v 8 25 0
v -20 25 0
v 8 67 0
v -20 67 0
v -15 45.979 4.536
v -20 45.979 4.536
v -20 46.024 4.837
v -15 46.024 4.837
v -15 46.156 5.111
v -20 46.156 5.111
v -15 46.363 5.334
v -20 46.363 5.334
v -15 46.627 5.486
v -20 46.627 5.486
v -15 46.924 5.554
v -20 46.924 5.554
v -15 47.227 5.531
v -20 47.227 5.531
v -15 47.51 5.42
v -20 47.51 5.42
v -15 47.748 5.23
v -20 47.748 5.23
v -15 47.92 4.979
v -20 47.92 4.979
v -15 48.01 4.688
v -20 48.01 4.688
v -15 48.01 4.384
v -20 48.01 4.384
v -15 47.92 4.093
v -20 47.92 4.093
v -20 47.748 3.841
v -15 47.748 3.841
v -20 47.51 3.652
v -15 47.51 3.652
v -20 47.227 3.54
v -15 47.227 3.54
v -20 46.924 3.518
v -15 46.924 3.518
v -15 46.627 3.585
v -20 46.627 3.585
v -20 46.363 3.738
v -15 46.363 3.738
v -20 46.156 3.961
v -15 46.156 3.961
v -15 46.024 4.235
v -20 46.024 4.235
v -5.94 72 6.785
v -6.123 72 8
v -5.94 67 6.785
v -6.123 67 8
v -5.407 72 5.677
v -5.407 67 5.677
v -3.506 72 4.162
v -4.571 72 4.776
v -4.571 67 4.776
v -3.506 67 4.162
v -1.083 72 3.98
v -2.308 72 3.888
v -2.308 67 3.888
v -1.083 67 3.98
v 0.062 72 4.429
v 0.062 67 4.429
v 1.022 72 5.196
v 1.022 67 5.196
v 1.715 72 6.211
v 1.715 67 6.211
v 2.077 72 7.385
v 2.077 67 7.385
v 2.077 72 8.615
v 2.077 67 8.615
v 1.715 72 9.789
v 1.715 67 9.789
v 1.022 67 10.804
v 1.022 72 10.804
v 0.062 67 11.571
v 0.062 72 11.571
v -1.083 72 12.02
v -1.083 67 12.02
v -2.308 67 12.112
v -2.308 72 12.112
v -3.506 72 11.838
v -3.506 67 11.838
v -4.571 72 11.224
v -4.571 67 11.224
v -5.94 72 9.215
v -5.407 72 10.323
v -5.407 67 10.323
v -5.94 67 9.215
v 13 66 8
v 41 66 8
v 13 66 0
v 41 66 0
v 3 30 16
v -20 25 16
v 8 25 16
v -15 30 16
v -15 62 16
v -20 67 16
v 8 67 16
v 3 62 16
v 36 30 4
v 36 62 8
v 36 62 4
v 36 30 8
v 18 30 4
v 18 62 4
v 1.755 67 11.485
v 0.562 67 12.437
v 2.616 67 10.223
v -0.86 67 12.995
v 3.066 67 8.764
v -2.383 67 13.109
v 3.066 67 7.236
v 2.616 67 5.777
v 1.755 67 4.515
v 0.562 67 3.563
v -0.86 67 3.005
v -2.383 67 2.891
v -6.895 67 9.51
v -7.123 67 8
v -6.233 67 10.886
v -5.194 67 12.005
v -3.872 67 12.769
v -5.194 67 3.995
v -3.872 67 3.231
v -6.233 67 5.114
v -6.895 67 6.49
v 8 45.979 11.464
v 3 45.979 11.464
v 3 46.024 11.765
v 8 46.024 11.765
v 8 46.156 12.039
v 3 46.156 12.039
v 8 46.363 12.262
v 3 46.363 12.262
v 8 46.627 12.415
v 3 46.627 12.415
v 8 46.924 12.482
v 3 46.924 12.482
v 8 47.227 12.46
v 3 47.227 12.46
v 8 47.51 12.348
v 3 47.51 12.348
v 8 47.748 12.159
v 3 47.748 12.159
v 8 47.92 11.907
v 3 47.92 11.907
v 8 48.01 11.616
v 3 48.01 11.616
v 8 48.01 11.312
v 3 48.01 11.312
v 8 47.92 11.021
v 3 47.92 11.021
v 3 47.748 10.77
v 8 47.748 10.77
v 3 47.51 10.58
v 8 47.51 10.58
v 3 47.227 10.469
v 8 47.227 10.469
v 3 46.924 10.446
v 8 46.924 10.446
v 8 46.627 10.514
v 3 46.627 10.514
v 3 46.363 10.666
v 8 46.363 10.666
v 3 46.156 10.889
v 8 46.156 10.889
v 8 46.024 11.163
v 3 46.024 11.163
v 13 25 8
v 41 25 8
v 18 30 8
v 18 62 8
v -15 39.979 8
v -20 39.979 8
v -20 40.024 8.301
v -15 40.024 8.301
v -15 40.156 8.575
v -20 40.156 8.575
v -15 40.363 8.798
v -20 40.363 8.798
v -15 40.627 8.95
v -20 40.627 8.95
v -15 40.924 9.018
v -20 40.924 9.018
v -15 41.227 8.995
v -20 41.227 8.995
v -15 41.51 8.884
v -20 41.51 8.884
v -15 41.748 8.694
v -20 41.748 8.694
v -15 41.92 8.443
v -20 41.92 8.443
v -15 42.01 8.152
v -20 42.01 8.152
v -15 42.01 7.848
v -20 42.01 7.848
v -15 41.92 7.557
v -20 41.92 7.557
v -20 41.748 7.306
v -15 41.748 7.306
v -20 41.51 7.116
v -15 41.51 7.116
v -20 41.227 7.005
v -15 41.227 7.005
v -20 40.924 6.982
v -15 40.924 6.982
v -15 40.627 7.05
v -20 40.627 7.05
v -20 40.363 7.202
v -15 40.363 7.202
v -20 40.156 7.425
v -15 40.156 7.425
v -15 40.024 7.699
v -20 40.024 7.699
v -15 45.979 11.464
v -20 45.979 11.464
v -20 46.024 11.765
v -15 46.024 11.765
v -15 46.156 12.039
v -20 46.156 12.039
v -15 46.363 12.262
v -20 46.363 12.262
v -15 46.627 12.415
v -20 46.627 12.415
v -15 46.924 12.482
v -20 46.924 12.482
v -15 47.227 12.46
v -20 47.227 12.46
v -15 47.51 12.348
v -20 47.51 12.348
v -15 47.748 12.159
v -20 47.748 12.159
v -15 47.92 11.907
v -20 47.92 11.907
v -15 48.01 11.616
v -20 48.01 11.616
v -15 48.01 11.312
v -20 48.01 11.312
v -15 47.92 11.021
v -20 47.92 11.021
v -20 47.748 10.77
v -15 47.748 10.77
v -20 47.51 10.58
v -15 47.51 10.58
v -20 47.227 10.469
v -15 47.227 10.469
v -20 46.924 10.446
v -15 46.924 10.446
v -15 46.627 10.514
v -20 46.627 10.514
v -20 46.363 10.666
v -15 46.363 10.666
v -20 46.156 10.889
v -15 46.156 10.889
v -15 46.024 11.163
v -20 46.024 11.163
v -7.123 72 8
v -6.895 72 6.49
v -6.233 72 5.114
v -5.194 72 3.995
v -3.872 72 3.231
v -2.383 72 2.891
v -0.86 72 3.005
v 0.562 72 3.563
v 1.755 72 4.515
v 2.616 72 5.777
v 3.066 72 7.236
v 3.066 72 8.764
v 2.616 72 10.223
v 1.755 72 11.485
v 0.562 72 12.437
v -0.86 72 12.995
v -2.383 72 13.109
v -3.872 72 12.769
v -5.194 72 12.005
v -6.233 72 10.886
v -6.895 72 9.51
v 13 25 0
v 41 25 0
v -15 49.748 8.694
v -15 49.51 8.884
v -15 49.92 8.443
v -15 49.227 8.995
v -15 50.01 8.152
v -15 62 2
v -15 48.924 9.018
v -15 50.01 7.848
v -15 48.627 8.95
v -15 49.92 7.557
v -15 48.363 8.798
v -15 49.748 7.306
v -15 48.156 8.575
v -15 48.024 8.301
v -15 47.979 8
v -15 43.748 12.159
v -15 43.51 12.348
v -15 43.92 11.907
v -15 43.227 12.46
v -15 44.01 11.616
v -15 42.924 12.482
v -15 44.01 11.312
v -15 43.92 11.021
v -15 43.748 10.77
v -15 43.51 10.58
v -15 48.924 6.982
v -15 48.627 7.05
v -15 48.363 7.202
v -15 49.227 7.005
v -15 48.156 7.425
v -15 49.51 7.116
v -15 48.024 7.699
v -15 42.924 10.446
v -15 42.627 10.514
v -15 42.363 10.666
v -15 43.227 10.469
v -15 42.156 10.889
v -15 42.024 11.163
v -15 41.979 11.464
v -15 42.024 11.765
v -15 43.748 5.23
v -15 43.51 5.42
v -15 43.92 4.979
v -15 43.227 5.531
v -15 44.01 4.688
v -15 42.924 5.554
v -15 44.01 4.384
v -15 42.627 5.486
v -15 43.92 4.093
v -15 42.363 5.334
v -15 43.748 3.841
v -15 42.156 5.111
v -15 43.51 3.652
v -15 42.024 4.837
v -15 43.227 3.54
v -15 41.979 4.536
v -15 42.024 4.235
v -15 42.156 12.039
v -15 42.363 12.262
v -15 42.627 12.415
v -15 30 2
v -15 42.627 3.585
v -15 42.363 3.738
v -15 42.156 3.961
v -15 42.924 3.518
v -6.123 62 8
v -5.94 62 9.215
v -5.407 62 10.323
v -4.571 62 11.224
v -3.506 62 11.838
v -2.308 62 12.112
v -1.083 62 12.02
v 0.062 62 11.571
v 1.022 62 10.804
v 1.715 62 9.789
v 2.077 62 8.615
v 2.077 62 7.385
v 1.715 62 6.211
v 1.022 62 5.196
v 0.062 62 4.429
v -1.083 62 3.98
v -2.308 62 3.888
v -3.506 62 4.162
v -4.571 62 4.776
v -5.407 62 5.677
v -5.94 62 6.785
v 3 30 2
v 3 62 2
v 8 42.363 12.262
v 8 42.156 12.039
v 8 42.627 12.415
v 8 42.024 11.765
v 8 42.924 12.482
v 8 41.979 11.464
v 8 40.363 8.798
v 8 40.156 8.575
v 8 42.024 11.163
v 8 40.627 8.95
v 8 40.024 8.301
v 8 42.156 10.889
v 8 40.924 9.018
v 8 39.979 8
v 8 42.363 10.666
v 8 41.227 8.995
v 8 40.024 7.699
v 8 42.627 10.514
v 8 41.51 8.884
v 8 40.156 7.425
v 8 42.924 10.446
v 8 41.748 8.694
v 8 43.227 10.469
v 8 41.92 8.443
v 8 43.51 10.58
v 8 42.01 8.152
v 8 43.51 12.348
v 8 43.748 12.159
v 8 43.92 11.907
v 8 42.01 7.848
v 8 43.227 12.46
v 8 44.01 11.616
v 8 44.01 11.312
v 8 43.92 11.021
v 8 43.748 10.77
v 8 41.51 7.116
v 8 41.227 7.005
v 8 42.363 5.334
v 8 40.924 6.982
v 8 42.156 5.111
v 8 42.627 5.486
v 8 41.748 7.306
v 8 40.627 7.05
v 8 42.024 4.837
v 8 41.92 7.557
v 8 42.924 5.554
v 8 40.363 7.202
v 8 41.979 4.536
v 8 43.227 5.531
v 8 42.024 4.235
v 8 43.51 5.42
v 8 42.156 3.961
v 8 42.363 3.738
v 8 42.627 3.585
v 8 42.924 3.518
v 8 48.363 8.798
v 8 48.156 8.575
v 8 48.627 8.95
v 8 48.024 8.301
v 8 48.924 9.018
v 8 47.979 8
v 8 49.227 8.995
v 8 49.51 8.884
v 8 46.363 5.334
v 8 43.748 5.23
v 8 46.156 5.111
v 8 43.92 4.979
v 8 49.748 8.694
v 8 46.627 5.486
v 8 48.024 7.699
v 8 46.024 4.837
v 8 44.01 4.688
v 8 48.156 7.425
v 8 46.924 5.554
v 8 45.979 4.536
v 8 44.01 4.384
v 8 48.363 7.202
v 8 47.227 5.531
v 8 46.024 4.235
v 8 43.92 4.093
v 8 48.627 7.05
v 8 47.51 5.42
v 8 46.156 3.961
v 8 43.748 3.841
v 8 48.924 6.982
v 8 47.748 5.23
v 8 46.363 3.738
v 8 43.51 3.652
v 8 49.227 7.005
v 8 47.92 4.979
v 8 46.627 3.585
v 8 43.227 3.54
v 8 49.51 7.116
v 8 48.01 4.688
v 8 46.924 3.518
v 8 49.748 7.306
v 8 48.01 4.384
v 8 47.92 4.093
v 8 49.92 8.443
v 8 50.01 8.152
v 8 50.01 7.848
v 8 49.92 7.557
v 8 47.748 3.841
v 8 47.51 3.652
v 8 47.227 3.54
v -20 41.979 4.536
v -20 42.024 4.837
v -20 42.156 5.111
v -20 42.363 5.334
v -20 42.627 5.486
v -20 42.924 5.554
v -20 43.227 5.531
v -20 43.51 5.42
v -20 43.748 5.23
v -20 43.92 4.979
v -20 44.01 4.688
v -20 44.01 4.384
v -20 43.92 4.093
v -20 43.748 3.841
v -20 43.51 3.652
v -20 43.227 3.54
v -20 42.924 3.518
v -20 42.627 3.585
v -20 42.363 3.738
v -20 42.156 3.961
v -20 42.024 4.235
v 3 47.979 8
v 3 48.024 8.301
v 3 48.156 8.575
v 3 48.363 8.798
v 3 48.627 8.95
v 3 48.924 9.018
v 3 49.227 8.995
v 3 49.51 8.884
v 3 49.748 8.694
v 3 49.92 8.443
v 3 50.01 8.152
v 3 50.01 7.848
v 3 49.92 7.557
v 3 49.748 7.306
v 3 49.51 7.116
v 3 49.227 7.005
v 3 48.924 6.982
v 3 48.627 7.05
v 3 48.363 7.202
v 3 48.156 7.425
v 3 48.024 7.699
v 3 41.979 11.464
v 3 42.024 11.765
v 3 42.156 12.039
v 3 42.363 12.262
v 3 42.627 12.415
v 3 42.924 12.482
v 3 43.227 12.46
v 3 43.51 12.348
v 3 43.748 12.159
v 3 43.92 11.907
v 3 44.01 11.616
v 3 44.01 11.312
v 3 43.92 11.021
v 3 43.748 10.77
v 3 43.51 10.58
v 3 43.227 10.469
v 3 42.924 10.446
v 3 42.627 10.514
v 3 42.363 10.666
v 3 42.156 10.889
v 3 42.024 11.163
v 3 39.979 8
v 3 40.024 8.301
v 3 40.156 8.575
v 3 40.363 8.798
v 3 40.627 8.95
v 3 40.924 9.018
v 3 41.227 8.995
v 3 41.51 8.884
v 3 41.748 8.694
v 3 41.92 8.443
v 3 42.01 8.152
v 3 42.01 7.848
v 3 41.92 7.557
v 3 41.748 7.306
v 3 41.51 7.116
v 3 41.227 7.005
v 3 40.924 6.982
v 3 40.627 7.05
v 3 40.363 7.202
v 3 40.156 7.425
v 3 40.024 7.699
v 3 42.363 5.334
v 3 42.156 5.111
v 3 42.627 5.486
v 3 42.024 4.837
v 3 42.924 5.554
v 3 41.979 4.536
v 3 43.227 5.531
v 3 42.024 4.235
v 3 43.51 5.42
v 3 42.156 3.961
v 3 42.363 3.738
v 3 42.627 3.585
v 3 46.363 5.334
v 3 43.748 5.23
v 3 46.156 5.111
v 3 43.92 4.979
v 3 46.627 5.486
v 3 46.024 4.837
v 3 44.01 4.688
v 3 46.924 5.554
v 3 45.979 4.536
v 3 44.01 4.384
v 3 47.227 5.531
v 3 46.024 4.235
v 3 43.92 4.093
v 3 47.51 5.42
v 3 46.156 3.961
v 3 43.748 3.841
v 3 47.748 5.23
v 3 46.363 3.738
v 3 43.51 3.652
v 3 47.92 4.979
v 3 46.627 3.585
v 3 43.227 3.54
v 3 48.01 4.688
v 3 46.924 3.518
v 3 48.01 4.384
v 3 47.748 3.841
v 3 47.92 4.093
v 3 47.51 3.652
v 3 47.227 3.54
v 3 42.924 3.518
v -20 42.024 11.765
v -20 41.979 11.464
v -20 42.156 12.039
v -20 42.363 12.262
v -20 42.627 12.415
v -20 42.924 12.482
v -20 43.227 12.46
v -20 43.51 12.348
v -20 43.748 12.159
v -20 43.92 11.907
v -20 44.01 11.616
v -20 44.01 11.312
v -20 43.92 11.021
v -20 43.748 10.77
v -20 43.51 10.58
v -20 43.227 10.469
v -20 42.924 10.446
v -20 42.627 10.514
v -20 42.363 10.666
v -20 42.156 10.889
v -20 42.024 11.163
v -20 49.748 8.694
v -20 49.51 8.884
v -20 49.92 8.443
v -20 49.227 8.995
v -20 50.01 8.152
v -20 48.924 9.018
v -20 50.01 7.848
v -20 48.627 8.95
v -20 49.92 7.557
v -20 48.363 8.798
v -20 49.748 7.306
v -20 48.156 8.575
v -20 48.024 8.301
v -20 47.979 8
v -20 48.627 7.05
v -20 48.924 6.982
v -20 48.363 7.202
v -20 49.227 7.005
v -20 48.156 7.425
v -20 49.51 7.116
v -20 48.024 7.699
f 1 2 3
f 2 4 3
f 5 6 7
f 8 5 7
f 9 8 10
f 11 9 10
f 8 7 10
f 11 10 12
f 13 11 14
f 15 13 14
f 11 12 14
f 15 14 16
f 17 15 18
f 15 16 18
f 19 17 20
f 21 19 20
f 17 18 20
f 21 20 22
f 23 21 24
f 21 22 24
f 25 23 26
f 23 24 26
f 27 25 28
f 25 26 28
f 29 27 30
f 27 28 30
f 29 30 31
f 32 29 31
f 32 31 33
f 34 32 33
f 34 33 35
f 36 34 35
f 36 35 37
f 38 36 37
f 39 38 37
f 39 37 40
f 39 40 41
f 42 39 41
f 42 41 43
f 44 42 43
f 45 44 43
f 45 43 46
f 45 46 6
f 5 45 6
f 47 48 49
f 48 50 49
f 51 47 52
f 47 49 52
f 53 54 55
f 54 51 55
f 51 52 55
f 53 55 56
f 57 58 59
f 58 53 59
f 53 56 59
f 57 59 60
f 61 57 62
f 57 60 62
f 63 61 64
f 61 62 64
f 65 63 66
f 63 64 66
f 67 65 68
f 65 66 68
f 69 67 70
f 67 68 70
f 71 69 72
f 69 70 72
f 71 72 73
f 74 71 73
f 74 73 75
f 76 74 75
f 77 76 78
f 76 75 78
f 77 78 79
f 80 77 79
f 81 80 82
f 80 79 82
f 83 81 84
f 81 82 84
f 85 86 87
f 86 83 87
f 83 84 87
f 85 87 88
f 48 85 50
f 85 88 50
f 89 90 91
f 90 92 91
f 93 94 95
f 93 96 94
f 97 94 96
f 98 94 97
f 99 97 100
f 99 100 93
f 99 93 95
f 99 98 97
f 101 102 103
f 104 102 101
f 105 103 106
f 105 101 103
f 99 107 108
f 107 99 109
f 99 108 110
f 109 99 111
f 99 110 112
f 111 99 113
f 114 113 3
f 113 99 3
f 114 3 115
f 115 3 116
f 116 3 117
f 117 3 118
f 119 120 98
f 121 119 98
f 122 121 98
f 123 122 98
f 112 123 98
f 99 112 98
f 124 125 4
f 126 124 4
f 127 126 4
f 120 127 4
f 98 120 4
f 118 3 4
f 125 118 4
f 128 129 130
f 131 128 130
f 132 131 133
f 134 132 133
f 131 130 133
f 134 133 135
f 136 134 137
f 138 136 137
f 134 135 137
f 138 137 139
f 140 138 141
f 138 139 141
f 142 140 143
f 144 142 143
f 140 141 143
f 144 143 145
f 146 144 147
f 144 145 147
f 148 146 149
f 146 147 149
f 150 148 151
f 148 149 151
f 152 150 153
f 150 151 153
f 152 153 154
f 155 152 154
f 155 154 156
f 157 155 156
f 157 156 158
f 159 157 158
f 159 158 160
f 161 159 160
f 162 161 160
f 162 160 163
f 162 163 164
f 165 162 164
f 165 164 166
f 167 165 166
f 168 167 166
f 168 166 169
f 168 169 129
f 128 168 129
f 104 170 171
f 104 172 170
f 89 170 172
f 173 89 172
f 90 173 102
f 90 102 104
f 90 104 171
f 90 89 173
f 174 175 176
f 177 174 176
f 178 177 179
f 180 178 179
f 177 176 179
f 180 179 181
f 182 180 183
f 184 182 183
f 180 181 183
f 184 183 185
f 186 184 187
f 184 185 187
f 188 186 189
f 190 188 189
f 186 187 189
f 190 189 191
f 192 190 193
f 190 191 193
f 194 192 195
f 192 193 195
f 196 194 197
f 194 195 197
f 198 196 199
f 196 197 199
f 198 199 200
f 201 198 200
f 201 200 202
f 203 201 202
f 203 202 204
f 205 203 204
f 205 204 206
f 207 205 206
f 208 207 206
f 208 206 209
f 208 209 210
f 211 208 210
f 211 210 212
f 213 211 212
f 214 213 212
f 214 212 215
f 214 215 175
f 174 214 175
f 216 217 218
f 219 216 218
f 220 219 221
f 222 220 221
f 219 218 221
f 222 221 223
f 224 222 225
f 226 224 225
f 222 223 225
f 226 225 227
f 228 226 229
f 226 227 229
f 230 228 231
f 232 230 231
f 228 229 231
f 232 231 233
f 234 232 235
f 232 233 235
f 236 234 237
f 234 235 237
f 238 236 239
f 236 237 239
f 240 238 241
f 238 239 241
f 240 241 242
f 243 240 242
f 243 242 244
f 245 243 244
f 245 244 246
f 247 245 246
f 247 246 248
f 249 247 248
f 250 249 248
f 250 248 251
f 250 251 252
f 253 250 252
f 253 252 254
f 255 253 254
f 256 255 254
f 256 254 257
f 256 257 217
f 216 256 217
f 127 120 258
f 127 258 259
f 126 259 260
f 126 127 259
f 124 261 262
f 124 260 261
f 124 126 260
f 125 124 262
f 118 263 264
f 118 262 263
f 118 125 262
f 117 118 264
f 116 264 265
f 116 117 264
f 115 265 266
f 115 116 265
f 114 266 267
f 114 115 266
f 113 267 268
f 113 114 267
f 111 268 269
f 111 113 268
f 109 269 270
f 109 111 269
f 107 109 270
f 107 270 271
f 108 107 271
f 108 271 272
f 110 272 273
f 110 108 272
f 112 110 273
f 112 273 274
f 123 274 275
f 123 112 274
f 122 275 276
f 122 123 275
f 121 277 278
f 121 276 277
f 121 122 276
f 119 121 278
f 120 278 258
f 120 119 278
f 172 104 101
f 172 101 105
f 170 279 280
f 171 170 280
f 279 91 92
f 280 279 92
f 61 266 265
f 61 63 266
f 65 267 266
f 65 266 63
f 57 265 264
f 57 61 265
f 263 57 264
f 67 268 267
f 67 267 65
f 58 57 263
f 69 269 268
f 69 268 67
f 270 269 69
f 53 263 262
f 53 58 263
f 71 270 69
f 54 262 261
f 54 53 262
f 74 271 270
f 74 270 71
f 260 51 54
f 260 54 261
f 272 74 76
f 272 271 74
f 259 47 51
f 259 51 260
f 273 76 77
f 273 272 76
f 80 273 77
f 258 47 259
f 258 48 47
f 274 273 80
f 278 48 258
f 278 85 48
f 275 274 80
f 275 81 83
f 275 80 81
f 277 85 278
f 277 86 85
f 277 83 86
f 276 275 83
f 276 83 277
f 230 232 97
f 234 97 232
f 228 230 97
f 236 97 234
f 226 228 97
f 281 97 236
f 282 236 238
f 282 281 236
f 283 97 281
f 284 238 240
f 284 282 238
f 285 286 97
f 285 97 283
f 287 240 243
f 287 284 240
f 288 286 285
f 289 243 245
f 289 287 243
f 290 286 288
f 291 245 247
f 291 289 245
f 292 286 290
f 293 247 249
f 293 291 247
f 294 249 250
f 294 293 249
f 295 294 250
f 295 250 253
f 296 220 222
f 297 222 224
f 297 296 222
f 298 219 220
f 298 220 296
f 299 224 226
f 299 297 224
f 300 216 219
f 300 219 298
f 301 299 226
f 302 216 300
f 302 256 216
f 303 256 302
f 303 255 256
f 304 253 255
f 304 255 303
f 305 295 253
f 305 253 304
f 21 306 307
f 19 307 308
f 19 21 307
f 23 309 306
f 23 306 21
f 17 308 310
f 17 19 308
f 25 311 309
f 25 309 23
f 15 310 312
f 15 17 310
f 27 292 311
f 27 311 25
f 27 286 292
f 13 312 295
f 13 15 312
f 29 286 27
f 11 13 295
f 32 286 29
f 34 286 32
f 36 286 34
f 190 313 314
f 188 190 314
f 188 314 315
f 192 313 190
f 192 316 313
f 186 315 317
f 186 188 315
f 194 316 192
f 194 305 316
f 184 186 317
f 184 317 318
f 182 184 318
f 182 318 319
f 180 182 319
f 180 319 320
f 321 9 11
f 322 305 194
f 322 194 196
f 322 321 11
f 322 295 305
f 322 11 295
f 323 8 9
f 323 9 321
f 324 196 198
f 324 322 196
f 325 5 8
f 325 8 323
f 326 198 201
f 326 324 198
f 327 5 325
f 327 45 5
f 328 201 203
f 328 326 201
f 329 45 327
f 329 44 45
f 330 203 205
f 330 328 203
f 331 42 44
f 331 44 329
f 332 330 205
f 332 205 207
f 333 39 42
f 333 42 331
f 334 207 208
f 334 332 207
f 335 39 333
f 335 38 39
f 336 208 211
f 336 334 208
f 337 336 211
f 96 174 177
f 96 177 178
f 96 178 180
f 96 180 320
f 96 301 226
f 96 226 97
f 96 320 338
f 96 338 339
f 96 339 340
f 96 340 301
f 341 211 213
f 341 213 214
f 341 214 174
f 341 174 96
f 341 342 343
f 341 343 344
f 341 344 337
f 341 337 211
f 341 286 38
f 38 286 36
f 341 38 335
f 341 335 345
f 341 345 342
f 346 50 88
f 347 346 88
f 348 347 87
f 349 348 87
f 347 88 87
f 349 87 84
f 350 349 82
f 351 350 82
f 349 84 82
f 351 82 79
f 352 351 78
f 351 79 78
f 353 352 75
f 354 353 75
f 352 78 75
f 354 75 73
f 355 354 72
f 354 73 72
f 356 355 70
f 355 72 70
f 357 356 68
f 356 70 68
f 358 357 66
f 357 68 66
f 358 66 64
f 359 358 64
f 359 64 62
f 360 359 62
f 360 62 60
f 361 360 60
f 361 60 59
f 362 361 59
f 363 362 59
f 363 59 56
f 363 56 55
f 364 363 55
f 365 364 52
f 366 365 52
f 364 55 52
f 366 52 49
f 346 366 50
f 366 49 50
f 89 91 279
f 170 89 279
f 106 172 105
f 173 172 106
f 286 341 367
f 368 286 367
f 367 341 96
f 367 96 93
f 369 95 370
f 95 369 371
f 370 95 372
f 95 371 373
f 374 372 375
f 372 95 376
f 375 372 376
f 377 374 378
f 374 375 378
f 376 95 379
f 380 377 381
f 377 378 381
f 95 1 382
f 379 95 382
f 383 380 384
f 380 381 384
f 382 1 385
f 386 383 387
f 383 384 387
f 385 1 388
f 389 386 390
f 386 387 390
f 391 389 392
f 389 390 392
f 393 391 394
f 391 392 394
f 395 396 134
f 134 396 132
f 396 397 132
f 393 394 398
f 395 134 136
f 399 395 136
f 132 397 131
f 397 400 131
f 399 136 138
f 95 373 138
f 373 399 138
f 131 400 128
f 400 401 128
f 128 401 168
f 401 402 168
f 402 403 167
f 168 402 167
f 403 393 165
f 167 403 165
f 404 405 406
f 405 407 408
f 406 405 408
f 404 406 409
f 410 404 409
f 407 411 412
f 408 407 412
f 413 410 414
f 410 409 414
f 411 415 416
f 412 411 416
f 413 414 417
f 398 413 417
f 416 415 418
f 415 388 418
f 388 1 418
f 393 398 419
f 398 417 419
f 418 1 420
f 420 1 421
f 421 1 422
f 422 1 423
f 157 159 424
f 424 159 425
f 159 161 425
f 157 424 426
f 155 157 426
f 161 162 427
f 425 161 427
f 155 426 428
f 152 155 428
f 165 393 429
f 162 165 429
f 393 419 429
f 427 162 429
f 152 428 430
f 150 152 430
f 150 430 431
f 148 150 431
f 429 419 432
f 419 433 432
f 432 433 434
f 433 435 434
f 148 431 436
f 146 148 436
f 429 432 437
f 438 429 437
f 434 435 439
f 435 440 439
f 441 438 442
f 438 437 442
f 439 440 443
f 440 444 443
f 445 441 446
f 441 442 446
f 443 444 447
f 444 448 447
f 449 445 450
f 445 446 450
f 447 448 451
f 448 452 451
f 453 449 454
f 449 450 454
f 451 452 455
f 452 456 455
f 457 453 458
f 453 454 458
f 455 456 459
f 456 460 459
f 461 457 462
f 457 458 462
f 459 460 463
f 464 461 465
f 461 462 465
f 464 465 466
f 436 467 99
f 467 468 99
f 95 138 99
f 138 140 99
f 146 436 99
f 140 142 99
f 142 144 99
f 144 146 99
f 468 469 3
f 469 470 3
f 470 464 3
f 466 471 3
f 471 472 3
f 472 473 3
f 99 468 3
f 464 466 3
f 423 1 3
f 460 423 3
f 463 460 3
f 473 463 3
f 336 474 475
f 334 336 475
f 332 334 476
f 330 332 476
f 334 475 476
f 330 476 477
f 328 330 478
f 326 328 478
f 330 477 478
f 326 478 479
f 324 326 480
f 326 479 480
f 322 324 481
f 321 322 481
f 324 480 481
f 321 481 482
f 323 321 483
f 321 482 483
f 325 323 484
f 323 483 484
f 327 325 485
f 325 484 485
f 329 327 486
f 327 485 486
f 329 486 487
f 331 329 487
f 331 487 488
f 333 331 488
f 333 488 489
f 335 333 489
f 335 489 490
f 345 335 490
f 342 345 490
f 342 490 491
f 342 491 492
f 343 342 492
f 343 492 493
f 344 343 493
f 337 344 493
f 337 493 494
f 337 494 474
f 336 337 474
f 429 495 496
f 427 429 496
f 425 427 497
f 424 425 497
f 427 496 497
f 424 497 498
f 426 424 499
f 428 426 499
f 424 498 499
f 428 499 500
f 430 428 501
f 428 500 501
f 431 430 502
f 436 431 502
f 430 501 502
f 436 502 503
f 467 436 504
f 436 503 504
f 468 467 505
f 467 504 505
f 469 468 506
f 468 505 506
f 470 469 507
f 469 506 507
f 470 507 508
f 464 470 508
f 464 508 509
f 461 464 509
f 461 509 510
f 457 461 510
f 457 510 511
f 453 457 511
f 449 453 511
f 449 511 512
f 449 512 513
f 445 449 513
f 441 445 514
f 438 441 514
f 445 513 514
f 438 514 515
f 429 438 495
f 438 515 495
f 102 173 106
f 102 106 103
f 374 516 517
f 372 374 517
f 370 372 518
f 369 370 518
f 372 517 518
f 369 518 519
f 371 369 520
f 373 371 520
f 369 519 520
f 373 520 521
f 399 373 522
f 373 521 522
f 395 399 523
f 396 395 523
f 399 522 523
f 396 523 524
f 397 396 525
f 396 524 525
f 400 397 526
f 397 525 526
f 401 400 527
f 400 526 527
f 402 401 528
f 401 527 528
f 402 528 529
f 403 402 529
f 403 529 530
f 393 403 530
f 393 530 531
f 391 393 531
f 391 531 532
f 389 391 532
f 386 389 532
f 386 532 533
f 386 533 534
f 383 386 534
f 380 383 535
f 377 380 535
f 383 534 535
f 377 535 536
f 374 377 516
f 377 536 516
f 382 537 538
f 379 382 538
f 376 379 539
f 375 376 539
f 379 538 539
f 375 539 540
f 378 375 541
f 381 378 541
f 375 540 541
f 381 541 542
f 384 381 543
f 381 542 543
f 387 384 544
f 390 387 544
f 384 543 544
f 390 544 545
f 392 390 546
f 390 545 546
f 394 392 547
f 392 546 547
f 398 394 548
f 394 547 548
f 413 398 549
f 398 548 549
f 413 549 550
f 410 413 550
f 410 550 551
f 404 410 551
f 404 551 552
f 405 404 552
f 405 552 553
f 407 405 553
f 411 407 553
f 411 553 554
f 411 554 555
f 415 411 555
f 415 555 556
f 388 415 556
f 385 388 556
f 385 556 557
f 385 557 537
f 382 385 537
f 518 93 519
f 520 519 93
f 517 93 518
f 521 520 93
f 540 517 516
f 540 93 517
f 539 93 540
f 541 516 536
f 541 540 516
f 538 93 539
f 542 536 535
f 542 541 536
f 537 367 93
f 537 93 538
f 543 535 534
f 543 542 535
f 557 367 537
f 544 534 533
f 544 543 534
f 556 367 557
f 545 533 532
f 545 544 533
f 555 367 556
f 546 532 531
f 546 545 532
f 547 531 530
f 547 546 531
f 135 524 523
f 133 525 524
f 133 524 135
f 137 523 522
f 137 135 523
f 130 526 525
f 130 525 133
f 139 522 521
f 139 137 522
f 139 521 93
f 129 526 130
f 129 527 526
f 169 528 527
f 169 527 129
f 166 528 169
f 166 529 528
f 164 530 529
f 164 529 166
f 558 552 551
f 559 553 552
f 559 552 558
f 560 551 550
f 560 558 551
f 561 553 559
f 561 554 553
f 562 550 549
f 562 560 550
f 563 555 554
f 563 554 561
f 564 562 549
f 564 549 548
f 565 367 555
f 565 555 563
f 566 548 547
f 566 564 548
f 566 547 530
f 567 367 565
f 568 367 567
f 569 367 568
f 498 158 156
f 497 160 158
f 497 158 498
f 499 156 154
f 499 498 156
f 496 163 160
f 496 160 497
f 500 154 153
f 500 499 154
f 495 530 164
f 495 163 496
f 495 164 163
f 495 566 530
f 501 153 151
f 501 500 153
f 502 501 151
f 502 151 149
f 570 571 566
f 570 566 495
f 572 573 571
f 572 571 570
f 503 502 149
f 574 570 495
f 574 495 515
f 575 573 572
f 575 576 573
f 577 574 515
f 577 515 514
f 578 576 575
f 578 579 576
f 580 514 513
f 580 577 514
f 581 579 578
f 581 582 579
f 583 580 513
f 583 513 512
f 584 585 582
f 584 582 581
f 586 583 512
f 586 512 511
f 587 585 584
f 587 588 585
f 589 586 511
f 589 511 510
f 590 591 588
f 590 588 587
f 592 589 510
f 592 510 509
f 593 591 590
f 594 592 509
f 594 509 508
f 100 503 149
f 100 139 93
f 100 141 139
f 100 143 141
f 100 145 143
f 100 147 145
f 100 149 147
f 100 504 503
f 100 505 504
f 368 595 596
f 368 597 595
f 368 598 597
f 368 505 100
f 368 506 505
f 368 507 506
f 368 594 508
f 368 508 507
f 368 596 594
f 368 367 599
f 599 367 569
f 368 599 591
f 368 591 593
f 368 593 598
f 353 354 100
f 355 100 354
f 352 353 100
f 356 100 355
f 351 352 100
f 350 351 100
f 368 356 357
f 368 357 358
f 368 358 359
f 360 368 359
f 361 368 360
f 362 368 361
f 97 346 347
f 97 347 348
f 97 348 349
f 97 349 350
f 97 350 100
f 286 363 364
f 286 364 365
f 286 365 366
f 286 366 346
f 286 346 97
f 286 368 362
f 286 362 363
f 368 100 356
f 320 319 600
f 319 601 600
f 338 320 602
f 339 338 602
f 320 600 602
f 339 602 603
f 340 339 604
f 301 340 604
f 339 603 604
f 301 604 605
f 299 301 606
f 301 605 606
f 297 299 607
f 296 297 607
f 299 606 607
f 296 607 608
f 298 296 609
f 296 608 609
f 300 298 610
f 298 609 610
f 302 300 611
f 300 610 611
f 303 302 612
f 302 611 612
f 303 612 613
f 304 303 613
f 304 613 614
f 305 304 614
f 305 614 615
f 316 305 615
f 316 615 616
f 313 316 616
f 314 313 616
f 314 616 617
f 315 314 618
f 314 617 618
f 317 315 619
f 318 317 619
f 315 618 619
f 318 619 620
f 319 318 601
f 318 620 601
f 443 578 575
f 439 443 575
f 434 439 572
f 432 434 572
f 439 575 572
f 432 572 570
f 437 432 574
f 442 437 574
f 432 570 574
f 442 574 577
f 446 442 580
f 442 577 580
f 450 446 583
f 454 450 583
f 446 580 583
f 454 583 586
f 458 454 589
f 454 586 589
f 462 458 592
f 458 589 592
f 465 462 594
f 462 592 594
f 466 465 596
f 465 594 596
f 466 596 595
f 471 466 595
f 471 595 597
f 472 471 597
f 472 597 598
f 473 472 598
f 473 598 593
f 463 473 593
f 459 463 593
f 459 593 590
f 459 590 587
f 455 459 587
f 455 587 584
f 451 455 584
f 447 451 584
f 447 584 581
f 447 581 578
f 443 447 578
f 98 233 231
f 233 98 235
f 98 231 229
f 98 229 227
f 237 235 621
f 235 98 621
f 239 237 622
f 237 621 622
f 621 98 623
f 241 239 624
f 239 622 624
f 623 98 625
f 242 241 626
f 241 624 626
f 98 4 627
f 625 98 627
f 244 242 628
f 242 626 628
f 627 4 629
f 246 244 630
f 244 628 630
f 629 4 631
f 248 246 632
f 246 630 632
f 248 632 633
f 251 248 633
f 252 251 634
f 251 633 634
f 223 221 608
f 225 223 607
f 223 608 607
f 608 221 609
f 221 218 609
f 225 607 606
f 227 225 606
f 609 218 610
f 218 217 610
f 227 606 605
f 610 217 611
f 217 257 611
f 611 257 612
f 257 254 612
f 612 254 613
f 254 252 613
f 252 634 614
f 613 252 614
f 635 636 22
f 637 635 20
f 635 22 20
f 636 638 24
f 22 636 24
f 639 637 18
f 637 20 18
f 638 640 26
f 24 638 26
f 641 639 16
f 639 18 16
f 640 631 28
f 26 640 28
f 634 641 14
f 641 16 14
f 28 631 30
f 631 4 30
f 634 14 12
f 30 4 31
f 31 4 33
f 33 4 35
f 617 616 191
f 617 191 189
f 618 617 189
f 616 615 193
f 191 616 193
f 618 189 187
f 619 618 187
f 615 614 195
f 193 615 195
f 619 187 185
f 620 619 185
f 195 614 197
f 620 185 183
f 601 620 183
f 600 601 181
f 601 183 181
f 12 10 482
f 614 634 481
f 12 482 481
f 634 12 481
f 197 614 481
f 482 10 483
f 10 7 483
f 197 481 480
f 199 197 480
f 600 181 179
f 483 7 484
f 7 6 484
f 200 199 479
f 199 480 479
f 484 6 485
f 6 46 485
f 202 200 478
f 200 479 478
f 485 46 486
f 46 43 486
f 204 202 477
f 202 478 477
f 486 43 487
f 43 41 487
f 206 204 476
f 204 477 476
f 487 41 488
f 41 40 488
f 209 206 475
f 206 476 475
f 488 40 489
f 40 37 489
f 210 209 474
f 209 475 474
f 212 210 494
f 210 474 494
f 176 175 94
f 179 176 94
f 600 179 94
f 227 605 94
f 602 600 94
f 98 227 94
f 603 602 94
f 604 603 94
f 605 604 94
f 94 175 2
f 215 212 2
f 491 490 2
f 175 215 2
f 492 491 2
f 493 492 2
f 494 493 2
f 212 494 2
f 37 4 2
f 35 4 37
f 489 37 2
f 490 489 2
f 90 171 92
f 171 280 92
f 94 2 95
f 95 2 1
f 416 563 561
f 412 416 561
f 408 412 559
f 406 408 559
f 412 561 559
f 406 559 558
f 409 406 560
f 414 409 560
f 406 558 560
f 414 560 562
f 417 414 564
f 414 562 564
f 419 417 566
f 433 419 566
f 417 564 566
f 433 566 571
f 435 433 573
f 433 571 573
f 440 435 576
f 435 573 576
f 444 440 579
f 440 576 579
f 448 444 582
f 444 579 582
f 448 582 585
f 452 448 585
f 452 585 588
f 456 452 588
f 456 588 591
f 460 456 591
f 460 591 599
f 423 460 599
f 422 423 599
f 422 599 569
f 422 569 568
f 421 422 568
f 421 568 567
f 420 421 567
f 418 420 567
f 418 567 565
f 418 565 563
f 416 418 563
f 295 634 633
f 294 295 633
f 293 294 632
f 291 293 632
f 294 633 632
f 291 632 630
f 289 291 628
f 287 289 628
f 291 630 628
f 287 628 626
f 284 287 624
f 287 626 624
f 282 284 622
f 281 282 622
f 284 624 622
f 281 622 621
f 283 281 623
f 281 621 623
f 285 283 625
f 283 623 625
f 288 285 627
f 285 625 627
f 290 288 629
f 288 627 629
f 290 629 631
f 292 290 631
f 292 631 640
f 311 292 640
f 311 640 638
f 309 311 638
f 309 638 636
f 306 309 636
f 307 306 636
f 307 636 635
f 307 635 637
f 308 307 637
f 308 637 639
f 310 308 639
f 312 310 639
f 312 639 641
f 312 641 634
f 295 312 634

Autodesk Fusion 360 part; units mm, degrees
sketch "Sketch1" plane through (0, 0, 0) normal (0, 0, 1) x (1, 0, 0)
  line L0 (-15, 30) -> (3, 30)
  line L1 (3, 30) -> (3, 62)
  line L2 (3, 62) -> (-15, 62)
  line L3 (-15, 62) -> (-15, 30)
  line L4 (8, 67) -> (-20, 67)
  line L5 (-20, 67) -> (-20, 25)
  line L6 (-20, 25) -> (8, 25)
  line L7 (8, 25) -> (8, 67)
  dimension "d1" = 5
extrude "Extrude1" add sketch "Sketch1" along normal blind 16 makes body 1
sketch "Sketch2" plane through (0, 0, 0) normal (0, 0, -1) x (1, 0, 0)
  line L0 (-15, -62) -> (-15, -30)
  line L1 (-15, -30) -> (3, -30)
  line L2 (3, -30) -> (3, -62)
  line L3 (3, -62) -> (-15, -62)
  line L4 (8, -67) -> (8, -25)
  line L5 (8, -25) -> (-20, -25)
  line L6 (-20, -25) -> (-20, -67)
  line L7 (-20, -67) -> (8, -67)
  line L8 (-20, -25) -> (8, -25)
  line L9 (8, -25) -> (8, -67)
  line L10 (8, -67) -> (-20, -67)
  line L11 (-20, -67) -> (-20, -25)
extrude "Extrude2" add sketch "Sketch2" against normal blind 2 contours L0 L1 L2 L3 bodies 1
sketch "Sketch3" plane through (0, 67, 0) normal (0, 1, 0) x (-1, 0, 0)
  line L0 (-8, 0) -> (20, 0)
  line L1 (20, 0) -> (20, 16)
  line L2 (20, 16) -> (-8, 16)
  line L3 (-8, 16) -> (-8, 0)
  circle A0 centre (2, 8) radius 4.1231
  circle A1 centre (2, 8) radius 5.1231
  dimension "d8" = 1
extrude "Extrude4" add sketch "Sketch3" along normal blind 5 contours A1 bodies 1
extrude "Extrude3" cut sketch "Sketch3" against normal blind 5 contours A0 bodies 1
sketch "Sketch4" plane through (-20, 0, 0) normal (-1, 0, 0) x (0, -1, 0)
  line L0 (-67, 0) -> (-25, 0)
  line L1 (-25, 0) -> (-25, 16)
  line L2 (-25, 16) -> (-67, 16)
  line L3 (-67, 16) -> (-67, 0)
  circle A0 centre (-41, 8) radius 1.021
  circle A1 centre (-43, 11.4641) radius 1.021
  circle A2 centre (-47, 11.4641) radius 1.021
  circle A3 centre (-49, 8) radius 1.021
  circle A4 centre (-47, 4.5359) radius 1.021
  circle A5 centre (-43, 4.5359) radius 1.021
  point P0 (-45, 8)
  dimension "d12" = 360
extrude "Extrude5" cut sketch "Sketch4" against normal blind 32 contours A0 | A1 | A2 | A3 | A4 | A5 bodies 1
sketch "Sketch5" plane through (0, 0, 0) normal (0, 0, 1) x (1, 0, 0)
  line L0 (13, 25) -> (41, 25)
  line L1 (41, 25) -> (41, 66)
  line L2 (41, 66) -> (13, 66)
  line L3 (13, 66) -> (13, 25)
extrude "Extrude6" add sketch "Sketch5" along normal blind 8 separate body makes body 2
sketch "Sketch6" plane through (0, 0, 8) normal (0, 0, 1) x (-1, 0, 0)
  line L0 (-13, -66) -> (-13, -25)
  line L1 (-13, -25) -> (-41, -25)
  line L2 (-41, -25) -> (-41, -66)
  line L3 (-41, -66) -> (-13, -66)
  line L4 (-18, -62) -> (-36, -62)
  line L5 (-36, -62) -> (-36, -30)
  line L6 (-36, -30) -> (-18, -30)
  line L7 (-18, -30) -> (-18, -62)
extrude "Extrude7" cut sketch "Sketch6" against normal blind 4 contours L4 L5 L6 L7 bodies 2
